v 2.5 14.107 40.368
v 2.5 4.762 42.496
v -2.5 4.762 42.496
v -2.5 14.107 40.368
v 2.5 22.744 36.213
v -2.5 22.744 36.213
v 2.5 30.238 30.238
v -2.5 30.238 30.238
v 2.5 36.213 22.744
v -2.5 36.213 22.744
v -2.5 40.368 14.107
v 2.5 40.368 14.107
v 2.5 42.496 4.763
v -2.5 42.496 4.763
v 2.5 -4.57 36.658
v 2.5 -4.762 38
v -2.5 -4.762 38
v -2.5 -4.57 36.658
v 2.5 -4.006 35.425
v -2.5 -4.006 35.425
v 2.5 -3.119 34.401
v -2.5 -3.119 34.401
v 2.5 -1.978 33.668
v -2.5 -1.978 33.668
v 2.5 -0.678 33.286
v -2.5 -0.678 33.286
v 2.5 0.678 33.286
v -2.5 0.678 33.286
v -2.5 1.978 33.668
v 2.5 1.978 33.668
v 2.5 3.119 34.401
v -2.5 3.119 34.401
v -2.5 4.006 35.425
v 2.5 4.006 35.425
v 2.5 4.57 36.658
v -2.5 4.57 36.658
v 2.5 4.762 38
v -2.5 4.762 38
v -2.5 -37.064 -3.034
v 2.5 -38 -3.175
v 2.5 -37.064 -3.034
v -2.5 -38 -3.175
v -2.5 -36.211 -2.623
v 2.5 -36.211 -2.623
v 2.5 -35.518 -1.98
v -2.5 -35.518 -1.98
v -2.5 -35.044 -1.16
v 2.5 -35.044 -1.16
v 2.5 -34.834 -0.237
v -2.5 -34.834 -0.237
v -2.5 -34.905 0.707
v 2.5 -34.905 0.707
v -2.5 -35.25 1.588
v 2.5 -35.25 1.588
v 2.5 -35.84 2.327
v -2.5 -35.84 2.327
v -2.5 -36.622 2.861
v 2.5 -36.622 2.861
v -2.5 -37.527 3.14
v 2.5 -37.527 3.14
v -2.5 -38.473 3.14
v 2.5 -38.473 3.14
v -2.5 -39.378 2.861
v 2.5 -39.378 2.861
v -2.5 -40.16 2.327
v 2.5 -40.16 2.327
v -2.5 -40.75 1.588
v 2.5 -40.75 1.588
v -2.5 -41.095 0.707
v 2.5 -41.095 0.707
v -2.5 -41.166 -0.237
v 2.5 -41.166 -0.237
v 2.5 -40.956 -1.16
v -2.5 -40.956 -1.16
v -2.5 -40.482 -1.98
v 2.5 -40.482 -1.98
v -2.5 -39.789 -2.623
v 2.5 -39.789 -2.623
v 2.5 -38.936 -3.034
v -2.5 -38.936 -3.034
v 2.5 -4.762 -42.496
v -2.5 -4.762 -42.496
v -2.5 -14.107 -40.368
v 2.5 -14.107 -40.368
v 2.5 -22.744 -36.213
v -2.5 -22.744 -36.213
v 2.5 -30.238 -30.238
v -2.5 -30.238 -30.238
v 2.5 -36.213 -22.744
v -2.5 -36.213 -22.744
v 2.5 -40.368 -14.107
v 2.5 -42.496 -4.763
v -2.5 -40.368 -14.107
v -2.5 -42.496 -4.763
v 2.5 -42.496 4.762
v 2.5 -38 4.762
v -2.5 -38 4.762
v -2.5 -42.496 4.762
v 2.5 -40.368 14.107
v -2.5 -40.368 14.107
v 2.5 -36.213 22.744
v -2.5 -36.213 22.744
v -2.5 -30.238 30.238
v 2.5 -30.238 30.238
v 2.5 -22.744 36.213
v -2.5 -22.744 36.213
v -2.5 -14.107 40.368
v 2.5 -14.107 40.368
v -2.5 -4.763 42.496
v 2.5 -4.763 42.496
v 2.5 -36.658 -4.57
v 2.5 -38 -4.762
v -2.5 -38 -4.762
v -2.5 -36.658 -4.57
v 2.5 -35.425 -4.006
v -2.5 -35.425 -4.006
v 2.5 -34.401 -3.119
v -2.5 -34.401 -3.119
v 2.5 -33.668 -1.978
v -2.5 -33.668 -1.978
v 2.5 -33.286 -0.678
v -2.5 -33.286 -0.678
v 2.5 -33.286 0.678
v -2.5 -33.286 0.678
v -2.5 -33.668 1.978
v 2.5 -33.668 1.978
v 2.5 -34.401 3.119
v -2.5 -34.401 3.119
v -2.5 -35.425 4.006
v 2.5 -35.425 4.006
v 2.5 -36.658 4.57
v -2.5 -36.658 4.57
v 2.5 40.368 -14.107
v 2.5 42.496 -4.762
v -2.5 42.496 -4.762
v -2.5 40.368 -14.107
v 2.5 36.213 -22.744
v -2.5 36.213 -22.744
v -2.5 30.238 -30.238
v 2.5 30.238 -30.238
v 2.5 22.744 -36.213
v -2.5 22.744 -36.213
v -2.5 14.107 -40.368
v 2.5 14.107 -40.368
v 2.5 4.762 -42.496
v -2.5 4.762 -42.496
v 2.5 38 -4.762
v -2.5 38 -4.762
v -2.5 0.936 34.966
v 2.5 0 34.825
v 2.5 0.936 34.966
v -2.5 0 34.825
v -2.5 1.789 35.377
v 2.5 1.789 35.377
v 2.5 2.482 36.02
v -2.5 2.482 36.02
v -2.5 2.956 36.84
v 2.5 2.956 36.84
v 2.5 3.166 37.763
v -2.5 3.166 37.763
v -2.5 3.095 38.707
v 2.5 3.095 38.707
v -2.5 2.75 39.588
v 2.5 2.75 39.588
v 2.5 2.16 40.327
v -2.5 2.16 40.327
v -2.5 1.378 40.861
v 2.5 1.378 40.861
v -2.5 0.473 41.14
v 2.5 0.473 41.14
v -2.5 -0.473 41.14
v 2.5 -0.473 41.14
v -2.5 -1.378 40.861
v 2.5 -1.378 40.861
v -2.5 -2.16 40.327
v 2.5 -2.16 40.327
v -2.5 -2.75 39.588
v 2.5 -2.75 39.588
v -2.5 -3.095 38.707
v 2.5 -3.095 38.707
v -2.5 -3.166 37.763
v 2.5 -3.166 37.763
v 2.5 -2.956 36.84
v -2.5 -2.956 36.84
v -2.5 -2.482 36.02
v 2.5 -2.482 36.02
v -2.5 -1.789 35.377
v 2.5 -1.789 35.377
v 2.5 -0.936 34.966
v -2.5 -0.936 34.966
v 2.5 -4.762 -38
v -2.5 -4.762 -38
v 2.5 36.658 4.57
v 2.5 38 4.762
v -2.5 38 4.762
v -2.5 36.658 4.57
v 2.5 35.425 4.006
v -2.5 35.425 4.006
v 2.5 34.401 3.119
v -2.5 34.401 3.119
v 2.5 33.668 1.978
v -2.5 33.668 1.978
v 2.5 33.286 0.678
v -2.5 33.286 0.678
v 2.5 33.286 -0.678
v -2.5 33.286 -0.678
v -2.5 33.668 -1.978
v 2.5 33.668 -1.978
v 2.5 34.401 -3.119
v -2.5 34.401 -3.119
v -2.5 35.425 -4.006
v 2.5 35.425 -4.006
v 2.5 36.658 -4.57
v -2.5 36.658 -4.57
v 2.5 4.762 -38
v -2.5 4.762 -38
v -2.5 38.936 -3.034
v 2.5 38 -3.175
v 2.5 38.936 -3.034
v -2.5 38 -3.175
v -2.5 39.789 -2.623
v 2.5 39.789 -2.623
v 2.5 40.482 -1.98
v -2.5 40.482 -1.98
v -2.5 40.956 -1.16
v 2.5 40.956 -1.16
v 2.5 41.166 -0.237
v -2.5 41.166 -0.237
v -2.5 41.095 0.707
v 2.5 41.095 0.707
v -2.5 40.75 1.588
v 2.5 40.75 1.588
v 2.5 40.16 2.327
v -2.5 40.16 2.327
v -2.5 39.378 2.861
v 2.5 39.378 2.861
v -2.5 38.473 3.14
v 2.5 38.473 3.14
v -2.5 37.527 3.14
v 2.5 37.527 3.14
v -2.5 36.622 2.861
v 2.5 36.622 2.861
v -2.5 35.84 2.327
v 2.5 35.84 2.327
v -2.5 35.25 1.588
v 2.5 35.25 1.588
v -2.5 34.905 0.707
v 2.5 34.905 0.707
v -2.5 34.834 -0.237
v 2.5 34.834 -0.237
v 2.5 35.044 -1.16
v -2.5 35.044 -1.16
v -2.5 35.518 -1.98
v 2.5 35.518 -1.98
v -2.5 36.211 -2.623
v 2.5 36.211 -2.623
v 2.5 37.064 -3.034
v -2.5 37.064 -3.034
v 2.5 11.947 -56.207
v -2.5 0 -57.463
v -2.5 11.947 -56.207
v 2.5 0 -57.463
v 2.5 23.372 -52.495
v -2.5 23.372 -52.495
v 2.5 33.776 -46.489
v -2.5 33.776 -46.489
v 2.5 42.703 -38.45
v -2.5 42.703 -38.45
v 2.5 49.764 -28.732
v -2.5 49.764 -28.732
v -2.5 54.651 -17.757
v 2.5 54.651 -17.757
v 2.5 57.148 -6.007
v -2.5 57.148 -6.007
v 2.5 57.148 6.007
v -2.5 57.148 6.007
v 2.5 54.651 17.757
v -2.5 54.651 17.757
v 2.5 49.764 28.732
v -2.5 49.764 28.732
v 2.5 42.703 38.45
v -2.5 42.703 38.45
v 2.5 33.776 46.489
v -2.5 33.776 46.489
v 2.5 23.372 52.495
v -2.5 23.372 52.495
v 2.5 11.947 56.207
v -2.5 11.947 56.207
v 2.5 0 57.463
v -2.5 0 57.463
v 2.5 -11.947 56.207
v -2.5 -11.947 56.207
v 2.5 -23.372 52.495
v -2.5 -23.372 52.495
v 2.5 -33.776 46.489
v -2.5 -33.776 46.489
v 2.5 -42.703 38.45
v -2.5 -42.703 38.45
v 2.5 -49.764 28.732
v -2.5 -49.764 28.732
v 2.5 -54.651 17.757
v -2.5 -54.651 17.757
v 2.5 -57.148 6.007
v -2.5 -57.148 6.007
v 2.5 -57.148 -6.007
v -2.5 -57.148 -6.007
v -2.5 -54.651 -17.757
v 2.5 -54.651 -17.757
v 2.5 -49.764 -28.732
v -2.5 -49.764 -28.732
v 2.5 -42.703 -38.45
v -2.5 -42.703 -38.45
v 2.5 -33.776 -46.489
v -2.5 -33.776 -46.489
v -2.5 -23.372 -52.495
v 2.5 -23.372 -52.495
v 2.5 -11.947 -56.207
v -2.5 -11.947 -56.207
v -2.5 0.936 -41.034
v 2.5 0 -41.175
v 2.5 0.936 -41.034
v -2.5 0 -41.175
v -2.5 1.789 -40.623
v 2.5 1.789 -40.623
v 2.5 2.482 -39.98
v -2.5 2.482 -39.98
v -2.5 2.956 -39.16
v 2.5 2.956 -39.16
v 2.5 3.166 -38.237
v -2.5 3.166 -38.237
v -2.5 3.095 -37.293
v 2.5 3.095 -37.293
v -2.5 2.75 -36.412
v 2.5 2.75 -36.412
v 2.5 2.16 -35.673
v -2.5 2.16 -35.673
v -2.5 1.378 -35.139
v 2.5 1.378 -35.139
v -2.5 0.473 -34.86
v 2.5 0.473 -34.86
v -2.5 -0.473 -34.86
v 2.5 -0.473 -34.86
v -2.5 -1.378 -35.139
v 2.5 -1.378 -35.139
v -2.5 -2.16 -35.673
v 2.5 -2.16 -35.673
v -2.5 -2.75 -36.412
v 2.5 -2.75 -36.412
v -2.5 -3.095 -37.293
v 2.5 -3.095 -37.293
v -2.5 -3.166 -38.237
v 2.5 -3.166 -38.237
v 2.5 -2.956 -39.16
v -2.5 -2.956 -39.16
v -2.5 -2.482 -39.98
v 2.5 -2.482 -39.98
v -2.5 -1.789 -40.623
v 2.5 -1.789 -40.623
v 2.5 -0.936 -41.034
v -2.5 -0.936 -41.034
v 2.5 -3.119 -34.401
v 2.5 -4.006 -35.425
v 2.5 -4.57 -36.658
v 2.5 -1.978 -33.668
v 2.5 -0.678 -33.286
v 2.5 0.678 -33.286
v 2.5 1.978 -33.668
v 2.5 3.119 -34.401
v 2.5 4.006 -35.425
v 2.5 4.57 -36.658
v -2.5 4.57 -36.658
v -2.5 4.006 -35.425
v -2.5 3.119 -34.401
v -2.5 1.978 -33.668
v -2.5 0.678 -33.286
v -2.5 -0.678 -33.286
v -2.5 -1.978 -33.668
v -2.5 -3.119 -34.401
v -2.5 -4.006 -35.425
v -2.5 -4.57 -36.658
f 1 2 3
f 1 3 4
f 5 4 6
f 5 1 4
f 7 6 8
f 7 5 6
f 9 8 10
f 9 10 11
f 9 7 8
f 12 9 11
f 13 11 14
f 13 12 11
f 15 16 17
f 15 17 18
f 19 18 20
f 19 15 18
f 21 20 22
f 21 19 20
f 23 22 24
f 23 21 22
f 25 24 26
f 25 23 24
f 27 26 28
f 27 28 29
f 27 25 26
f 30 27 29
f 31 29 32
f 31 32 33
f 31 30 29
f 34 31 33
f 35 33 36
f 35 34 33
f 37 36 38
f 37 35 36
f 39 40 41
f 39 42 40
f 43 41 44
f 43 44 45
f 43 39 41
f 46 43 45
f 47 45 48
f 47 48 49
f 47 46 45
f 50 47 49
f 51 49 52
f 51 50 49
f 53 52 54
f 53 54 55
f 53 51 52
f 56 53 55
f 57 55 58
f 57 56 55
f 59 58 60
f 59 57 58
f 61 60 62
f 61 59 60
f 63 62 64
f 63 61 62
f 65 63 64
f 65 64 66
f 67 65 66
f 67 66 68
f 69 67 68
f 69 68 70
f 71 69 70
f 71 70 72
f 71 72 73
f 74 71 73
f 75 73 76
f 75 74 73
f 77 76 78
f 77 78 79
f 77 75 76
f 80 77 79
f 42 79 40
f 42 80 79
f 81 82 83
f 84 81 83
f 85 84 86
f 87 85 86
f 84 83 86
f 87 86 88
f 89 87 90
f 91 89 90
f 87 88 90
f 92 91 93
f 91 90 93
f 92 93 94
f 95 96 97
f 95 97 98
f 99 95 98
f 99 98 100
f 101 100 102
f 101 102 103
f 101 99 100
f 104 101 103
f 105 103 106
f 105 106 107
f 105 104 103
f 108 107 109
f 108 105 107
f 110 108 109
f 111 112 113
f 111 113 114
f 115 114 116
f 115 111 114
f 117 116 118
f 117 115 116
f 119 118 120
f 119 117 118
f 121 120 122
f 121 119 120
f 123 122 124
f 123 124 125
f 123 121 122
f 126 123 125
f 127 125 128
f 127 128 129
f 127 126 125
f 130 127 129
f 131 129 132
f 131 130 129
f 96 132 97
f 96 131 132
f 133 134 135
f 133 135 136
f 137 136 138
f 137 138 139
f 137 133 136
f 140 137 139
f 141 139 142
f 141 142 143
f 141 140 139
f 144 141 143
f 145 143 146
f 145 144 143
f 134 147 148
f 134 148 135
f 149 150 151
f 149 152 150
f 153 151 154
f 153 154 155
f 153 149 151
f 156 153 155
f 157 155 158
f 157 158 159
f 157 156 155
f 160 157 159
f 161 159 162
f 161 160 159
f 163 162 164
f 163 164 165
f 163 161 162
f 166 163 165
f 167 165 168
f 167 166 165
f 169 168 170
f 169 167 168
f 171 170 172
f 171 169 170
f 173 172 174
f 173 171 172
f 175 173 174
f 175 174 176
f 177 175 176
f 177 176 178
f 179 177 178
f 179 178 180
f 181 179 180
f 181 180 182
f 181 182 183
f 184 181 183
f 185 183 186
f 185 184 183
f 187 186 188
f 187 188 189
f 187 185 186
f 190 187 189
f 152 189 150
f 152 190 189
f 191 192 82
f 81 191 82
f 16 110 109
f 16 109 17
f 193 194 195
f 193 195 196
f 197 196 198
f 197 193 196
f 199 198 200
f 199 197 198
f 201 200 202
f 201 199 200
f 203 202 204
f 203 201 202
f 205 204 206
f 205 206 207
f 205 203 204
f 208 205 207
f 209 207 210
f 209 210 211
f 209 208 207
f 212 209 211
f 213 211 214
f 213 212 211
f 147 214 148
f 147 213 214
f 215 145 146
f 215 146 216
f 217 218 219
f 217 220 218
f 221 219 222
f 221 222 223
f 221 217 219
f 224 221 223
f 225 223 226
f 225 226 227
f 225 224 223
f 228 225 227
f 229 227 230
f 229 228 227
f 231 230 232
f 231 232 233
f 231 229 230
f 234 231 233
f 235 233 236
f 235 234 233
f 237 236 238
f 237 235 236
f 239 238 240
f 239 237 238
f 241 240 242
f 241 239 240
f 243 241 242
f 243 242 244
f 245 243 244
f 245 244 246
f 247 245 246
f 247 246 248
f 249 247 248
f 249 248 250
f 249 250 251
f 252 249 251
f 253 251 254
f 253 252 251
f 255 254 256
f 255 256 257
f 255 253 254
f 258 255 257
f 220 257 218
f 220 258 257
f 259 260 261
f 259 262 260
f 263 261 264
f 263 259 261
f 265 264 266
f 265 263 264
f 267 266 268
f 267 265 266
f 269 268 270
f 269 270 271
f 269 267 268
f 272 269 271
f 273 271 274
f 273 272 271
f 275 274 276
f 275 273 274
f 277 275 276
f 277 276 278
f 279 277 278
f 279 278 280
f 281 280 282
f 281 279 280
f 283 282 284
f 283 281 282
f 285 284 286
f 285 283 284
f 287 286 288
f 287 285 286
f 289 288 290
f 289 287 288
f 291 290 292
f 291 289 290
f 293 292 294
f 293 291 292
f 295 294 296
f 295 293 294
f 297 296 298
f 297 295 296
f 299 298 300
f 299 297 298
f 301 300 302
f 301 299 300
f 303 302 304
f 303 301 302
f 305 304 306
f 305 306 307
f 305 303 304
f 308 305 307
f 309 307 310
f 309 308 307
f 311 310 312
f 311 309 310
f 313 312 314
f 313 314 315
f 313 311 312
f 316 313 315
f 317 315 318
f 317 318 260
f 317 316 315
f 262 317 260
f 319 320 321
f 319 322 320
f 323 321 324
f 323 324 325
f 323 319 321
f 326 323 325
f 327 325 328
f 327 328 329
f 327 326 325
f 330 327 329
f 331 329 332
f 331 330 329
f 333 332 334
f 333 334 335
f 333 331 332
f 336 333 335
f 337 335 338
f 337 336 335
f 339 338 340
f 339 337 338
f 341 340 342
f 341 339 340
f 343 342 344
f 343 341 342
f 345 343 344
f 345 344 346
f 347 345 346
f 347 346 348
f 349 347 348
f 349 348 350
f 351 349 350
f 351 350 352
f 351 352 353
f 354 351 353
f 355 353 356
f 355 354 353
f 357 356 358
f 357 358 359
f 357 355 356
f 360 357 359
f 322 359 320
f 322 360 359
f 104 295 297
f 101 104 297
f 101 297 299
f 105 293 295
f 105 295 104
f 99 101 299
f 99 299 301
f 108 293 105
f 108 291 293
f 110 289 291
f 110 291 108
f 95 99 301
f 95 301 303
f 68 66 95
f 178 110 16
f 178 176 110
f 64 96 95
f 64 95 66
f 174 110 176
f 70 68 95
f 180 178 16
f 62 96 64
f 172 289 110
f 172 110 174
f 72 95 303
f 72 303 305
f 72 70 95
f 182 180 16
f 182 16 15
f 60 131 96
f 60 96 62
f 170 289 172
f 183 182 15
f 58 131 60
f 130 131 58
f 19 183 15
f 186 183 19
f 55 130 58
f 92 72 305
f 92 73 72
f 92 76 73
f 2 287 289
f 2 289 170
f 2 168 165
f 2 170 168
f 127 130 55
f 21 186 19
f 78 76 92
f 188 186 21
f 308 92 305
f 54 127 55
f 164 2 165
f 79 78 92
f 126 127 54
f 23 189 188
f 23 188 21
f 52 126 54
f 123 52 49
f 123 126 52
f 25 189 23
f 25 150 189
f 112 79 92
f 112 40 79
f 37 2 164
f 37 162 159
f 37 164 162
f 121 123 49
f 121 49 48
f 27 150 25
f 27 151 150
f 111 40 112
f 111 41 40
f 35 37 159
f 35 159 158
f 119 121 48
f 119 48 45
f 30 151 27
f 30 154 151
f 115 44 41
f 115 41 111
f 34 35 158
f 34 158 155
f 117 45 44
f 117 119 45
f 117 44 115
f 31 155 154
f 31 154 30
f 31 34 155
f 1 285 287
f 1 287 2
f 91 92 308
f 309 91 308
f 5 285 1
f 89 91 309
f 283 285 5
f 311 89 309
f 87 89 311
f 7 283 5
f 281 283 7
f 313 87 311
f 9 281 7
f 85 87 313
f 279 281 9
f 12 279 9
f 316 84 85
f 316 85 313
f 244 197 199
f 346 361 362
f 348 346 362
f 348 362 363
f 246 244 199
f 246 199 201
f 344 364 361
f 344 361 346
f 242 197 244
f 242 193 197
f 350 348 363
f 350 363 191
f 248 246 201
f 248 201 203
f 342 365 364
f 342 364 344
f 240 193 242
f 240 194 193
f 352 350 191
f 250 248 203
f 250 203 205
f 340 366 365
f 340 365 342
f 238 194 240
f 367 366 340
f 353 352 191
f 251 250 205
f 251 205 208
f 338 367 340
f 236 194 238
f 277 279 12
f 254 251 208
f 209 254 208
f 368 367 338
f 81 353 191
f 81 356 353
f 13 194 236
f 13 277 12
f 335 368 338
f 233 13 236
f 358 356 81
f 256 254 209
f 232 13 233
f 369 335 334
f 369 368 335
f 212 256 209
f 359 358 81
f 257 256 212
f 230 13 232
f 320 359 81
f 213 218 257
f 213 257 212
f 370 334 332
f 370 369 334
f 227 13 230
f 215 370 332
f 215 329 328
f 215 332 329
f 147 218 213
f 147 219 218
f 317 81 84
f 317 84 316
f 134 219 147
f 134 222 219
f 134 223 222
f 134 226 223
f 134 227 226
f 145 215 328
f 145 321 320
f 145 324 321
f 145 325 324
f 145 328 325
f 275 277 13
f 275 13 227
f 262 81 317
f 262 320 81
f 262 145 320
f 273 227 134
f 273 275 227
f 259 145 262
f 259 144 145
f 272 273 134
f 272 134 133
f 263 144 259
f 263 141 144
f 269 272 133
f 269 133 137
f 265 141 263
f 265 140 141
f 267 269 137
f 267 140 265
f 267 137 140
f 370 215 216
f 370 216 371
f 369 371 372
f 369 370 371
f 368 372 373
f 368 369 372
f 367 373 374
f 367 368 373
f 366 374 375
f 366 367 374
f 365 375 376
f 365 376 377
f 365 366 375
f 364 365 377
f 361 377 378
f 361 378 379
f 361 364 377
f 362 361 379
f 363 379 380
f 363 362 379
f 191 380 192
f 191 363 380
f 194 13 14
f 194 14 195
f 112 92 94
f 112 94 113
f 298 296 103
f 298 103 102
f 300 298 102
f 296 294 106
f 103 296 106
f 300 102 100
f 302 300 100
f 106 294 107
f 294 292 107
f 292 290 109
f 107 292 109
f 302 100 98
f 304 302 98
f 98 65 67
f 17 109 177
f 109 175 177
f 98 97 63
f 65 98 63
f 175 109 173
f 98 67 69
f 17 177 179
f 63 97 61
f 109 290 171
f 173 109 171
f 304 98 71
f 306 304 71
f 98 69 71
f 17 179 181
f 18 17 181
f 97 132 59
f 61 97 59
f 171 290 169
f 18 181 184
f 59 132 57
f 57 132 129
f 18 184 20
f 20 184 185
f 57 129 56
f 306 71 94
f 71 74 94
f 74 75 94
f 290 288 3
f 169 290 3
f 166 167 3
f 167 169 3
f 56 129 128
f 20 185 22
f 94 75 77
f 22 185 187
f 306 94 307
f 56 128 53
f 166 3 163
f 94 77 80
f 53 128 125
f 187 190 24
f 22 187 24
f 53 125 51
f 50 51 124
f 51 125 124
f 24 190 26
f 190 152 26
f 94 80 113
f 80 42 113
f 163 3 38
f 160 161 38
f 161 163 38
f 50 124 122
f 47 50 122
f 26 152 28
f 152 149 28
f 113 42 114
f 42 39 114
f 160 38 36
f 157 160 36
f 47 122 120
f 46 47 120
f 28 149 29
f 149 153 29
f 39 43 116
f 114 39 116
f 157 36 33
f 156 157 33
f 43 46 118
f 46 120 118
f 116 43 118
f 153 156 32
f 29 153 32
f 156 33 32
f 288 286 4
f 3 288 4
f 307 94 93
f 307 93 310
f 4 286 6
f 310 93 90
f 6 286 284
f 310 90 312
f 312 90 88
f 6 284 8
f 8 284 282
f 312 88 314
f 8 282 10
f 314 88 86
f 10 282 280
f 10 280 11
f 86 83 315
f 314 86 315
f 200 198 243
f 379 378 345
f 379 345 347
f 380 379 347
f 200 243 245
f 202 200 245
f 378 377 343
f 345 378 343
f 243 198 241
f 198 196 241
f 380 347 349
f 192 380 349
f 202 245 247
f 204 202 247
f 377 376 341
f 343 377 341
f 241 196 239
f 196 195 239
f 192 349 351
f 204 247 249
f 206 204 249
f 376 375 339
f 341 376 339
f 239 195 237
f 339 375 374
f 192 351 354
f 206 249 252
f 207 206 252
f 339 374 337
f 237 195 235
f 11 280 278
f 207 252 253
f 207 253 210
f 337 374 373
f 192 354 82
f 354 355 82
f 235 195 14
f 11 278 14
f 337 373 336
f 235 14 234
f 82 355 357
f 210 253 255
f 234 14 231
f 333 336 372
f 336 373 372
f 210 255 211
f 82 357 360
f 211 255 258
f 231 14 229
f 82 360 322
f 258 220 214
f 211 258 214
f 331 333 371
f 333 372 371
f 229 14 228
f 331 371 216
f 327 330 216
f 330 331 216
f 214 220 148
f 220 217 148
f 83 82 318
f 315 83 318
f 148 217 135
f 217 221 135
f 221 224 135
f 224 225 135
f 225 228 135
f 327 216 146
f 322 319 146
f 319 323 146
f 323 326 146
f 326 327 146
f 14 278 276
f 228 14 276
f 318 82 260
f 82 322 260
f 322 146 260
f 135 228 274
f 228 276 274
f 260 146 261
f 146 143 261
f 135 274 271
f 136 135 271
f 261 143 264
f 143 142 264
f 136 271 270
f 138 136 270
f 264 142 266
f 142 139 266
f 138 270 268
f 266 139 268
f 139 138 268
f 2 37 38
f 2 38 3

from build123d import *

# Parameters (mm, degrees)
SKETCH1_R           = 57.463033318
SKETCH1_R_2         = 42.7625
SKETCH1_R_3         = 3.175
BOSS_EXTRUDE1_DEPTH = 2.5


with BuildPart() as part:
    # Sketch1 → Boss-Extrude1 (new body, symmetric)
    with BuildSketch(Plane(origin=(0, 0, 0), x_dir=(0, 0, -1), z_dir=(1, 0, 0))):
        Circle(SKETCH1_R)
        Circle(SKETCH1_R_2, mode=Mode.SUBTRACT)
        with BuildLine():
            Line((-38, 4.7625), (-42.496470442, 4.7625))
            ThreePointArc((-42.496470442, 4.7625), (-42.7625, 0), (-42.496470442, -4.7625))
            Line((-42.496470442, -4.7625), (-38, -4.7625))
            ThreePointArc((-38, -4.7625), (-33.2375, 0), (-38, 4.7625))
        make_face()
        with Locations((-38, 0)):
            Circle(SKETCH1_R_3, mode=Mode.SUBTRACT)
        with BuildLine():
            ThreePointArc((4.7625, 42.496470442), (0, 42.7625), (-4.7625, 42.496470442))
            Line((-4.7625, 42.496470442), (-4.7625, 38))
            ThreePointArc((-4.7625, 38), (0, 33.2375), (4.7625, 38))
            Line((4.7625, 38), (4.7625, 42.496470442))
        make_face()
        with Locations((0, 38)):
            Circle(SKETCH1_R_3, mode=Mode.SUBTRACT)
        with BuildLine():
            ThreePointArc((42.7625, 0), (42.695940811, 2.384962158), (42.496470442, 4.7625))
            Line((42.496470442, 4.7625), (38, 4.7625))
            ThreePointArc((38, 4.7625), (33.2375, 0), (38, -4.7625))
            Line((38, -4.7625), (42.496470442, -4.7625))
            ThreePointArc((42.496470442, -4.7625), (42.695940811, -2.384962158), (42.7625, 0))
        make_face()
        with Locations((38, 0)):
            Circle(SKETCH1_R_3, mode=Mode.SUBTRACT)
        with BuildLine():
            Line((-4.7625, -38), (-4.7625, -42.496470442))
            ThreePointArc((-4.7625, -42.496470442), (0, -42.7625), (4.7625, -42.496470442))
            Line((4.7625, -42.496470442), (4.7625, -38))
            ThreePointArc((4.7625, -38), (0, -33.2375), (-4.7625, -38))
        make_face()
        with Locations((0, -38)):
            Circle(SKETCH1_R_3, mode=Mode.SUBTRACT)
    extrude(amount=BOSS_EXTRUDE1_DEPTH, both=True)


solid = part.part
